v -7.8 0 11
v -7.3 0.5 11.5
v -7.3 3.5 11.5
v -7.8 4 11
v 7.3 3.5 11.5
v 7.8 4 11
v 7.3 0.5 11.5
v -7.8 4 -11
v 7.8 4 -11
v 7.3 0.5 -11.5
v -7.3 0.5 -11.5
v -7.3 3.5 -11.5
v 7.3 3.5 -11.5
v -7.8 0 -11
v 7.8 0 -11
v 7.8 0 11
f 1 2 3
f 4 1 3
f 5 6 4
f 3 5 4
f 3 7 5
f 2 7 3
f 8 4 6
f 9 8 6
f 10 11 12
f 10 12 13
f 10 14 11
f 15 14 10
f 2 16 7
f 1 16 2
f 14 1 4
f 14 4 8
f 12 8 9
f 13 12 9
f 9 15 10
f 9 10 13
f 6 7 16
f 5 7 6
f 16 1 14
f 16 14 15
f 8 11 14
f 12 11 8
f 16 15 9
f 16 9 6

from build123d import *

# Parameters (mm, degrees)
F1_DEPTH = 4
F2_SIZE  = 0.5


with BuildPart() as f1:
    # F0 (on Front) → F1 (new body)
    with BuildSketch(Plane.XZ):
        Polygon((0, 11.5), (-7.8, 11.5), (-7.8, 0), (-7.8, -11.5), (0, -11.5), (7.8, -11.5), (7.8, 0), (7.8, 11.5), align=None)
    extrude(amount=-F1_DEPTH)

    # F2
    f2_edges = [f1.edges().sort_by_distance(p)[0] for p in [
        (-7.8, 2, 11.5),
        (0, 0, 11.5),
        (7.8, 2, 11.5),
        (0, 4, 11.5),
        (0, 0, -11.5),
        (-7.8, 2, -11.5),
        (7.8, 2, -11.5),
        (0, 4, -11.5),
    ]]
    chamfer(f2_edges, length=F2_SIZE)


solid = f1.part
